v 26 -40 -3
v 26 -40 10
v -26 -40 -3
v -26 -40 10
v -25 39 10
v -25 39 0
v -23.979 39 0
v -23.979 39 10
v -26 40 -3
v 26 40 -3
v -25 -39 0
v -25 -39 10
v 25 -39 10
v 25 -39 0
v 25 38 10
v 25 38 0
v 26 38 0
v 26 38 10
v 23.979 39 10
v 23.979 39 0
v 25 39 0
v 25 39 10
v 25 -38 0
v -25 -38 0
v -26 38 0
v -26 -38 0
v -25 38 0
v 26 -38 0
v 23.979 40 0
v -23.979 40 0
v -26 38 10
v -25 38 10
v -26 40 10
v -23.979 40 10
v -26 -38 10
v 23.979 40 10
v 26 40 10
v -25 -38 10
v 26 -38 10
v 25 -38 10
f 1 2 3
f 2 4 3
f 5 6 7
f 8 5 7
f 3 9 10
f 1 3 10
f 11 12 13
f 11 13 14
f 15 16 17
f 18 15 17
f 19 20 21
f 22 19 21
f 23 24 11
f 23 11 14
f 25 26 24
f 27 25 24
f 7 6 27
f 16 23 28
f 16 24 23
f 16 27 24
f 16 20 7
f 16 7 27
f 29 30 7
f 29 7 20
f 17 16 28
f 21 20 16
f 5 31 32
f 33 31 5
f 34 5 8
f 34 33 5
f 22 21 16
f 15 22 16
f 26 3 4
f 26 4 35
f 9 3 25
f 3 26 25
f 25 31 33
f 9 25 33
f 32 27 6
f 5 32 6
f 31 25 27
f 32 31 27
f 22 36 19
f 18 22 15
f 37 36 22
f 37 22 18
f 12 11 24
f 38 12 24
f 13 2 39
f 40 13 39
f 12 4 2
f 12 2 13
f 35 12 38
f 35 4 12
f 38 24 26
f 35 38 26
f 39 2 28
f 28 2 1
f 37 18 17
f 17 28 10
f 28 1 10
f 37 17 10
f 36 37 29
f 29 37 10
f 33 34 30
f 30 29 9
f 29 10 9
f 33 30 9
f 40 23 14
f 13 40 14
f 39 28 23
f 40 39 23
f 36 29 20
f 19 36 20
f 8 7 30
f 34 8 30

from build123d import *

# Parameters (mm, degrees)
SKETCH_4_W      = 52
SKETCH_4_H      = 80
EXTRUDE_3_DEPTH = 3
EXTRUDE_6_DEPTH = 10
EXTRUDE_7_REACH = 51.979
SKETCH_7_W      = 10
SKETCH_7_H      = 1


with BuildPart() as part:
    # 草图4 → 凸台-拉伸3 (new body)
    with BuildSketch(Plane.XY):
        Rectangle(SKETCH_4_W, SKETCH_4_H)
    extrude(amount=-EXTRUDE_3_DEPTH)

    # 草图6 → 凸台-拉伸6 (add)
    with BuildSketch(Plane.XY):
        Polygon((26, 40), (23.978927851, 40), (23.978927851, 39), (25, 39), (25, 38), (26, 38), align=None)
        Polygon((-25, -38), (-26, -38), (-26, -40), (-23.978927851, -40), (-23.978927851, -39), (-25, -39), align=None)
        Polygon((23.978927851, -39), (23.978927851, -40), (26, -40), (26, -38), (25, -38), (25, -39), align=None)
        Polygon((-26, 40), (-26, 38), (-25, 38), (-25, 39), (-23.978927851, 39), (-23.978927851, 40), align=None)
    extrude(amount=EXTRUDE_6_DEPTH)

    # 草图7 → 凸台-拉伸7 (add, up to next)
    with BuildSketch(Plane(origin=(-23.978927851, 0, 0), x_dir=(0, 0, -1), z_dir=(1, 0, 0)), mode=Mode.PRIVATE) as extrude_7_sk1:
        with Locations((-5, -39.5)):
            Rectangle(SKETCH_7_W, SKETCH_7_H)
    extrude_7_tool1 = extrude(extrude_7_sk1.sketch, amount=EXTRUDE_7_REACH, mode=Mode.PRIVATE) - part.part
    add(extrude_7_tool1.solids().sort_by_distance((-23.978928, -39.5, 5))[0])


solid = part.part
